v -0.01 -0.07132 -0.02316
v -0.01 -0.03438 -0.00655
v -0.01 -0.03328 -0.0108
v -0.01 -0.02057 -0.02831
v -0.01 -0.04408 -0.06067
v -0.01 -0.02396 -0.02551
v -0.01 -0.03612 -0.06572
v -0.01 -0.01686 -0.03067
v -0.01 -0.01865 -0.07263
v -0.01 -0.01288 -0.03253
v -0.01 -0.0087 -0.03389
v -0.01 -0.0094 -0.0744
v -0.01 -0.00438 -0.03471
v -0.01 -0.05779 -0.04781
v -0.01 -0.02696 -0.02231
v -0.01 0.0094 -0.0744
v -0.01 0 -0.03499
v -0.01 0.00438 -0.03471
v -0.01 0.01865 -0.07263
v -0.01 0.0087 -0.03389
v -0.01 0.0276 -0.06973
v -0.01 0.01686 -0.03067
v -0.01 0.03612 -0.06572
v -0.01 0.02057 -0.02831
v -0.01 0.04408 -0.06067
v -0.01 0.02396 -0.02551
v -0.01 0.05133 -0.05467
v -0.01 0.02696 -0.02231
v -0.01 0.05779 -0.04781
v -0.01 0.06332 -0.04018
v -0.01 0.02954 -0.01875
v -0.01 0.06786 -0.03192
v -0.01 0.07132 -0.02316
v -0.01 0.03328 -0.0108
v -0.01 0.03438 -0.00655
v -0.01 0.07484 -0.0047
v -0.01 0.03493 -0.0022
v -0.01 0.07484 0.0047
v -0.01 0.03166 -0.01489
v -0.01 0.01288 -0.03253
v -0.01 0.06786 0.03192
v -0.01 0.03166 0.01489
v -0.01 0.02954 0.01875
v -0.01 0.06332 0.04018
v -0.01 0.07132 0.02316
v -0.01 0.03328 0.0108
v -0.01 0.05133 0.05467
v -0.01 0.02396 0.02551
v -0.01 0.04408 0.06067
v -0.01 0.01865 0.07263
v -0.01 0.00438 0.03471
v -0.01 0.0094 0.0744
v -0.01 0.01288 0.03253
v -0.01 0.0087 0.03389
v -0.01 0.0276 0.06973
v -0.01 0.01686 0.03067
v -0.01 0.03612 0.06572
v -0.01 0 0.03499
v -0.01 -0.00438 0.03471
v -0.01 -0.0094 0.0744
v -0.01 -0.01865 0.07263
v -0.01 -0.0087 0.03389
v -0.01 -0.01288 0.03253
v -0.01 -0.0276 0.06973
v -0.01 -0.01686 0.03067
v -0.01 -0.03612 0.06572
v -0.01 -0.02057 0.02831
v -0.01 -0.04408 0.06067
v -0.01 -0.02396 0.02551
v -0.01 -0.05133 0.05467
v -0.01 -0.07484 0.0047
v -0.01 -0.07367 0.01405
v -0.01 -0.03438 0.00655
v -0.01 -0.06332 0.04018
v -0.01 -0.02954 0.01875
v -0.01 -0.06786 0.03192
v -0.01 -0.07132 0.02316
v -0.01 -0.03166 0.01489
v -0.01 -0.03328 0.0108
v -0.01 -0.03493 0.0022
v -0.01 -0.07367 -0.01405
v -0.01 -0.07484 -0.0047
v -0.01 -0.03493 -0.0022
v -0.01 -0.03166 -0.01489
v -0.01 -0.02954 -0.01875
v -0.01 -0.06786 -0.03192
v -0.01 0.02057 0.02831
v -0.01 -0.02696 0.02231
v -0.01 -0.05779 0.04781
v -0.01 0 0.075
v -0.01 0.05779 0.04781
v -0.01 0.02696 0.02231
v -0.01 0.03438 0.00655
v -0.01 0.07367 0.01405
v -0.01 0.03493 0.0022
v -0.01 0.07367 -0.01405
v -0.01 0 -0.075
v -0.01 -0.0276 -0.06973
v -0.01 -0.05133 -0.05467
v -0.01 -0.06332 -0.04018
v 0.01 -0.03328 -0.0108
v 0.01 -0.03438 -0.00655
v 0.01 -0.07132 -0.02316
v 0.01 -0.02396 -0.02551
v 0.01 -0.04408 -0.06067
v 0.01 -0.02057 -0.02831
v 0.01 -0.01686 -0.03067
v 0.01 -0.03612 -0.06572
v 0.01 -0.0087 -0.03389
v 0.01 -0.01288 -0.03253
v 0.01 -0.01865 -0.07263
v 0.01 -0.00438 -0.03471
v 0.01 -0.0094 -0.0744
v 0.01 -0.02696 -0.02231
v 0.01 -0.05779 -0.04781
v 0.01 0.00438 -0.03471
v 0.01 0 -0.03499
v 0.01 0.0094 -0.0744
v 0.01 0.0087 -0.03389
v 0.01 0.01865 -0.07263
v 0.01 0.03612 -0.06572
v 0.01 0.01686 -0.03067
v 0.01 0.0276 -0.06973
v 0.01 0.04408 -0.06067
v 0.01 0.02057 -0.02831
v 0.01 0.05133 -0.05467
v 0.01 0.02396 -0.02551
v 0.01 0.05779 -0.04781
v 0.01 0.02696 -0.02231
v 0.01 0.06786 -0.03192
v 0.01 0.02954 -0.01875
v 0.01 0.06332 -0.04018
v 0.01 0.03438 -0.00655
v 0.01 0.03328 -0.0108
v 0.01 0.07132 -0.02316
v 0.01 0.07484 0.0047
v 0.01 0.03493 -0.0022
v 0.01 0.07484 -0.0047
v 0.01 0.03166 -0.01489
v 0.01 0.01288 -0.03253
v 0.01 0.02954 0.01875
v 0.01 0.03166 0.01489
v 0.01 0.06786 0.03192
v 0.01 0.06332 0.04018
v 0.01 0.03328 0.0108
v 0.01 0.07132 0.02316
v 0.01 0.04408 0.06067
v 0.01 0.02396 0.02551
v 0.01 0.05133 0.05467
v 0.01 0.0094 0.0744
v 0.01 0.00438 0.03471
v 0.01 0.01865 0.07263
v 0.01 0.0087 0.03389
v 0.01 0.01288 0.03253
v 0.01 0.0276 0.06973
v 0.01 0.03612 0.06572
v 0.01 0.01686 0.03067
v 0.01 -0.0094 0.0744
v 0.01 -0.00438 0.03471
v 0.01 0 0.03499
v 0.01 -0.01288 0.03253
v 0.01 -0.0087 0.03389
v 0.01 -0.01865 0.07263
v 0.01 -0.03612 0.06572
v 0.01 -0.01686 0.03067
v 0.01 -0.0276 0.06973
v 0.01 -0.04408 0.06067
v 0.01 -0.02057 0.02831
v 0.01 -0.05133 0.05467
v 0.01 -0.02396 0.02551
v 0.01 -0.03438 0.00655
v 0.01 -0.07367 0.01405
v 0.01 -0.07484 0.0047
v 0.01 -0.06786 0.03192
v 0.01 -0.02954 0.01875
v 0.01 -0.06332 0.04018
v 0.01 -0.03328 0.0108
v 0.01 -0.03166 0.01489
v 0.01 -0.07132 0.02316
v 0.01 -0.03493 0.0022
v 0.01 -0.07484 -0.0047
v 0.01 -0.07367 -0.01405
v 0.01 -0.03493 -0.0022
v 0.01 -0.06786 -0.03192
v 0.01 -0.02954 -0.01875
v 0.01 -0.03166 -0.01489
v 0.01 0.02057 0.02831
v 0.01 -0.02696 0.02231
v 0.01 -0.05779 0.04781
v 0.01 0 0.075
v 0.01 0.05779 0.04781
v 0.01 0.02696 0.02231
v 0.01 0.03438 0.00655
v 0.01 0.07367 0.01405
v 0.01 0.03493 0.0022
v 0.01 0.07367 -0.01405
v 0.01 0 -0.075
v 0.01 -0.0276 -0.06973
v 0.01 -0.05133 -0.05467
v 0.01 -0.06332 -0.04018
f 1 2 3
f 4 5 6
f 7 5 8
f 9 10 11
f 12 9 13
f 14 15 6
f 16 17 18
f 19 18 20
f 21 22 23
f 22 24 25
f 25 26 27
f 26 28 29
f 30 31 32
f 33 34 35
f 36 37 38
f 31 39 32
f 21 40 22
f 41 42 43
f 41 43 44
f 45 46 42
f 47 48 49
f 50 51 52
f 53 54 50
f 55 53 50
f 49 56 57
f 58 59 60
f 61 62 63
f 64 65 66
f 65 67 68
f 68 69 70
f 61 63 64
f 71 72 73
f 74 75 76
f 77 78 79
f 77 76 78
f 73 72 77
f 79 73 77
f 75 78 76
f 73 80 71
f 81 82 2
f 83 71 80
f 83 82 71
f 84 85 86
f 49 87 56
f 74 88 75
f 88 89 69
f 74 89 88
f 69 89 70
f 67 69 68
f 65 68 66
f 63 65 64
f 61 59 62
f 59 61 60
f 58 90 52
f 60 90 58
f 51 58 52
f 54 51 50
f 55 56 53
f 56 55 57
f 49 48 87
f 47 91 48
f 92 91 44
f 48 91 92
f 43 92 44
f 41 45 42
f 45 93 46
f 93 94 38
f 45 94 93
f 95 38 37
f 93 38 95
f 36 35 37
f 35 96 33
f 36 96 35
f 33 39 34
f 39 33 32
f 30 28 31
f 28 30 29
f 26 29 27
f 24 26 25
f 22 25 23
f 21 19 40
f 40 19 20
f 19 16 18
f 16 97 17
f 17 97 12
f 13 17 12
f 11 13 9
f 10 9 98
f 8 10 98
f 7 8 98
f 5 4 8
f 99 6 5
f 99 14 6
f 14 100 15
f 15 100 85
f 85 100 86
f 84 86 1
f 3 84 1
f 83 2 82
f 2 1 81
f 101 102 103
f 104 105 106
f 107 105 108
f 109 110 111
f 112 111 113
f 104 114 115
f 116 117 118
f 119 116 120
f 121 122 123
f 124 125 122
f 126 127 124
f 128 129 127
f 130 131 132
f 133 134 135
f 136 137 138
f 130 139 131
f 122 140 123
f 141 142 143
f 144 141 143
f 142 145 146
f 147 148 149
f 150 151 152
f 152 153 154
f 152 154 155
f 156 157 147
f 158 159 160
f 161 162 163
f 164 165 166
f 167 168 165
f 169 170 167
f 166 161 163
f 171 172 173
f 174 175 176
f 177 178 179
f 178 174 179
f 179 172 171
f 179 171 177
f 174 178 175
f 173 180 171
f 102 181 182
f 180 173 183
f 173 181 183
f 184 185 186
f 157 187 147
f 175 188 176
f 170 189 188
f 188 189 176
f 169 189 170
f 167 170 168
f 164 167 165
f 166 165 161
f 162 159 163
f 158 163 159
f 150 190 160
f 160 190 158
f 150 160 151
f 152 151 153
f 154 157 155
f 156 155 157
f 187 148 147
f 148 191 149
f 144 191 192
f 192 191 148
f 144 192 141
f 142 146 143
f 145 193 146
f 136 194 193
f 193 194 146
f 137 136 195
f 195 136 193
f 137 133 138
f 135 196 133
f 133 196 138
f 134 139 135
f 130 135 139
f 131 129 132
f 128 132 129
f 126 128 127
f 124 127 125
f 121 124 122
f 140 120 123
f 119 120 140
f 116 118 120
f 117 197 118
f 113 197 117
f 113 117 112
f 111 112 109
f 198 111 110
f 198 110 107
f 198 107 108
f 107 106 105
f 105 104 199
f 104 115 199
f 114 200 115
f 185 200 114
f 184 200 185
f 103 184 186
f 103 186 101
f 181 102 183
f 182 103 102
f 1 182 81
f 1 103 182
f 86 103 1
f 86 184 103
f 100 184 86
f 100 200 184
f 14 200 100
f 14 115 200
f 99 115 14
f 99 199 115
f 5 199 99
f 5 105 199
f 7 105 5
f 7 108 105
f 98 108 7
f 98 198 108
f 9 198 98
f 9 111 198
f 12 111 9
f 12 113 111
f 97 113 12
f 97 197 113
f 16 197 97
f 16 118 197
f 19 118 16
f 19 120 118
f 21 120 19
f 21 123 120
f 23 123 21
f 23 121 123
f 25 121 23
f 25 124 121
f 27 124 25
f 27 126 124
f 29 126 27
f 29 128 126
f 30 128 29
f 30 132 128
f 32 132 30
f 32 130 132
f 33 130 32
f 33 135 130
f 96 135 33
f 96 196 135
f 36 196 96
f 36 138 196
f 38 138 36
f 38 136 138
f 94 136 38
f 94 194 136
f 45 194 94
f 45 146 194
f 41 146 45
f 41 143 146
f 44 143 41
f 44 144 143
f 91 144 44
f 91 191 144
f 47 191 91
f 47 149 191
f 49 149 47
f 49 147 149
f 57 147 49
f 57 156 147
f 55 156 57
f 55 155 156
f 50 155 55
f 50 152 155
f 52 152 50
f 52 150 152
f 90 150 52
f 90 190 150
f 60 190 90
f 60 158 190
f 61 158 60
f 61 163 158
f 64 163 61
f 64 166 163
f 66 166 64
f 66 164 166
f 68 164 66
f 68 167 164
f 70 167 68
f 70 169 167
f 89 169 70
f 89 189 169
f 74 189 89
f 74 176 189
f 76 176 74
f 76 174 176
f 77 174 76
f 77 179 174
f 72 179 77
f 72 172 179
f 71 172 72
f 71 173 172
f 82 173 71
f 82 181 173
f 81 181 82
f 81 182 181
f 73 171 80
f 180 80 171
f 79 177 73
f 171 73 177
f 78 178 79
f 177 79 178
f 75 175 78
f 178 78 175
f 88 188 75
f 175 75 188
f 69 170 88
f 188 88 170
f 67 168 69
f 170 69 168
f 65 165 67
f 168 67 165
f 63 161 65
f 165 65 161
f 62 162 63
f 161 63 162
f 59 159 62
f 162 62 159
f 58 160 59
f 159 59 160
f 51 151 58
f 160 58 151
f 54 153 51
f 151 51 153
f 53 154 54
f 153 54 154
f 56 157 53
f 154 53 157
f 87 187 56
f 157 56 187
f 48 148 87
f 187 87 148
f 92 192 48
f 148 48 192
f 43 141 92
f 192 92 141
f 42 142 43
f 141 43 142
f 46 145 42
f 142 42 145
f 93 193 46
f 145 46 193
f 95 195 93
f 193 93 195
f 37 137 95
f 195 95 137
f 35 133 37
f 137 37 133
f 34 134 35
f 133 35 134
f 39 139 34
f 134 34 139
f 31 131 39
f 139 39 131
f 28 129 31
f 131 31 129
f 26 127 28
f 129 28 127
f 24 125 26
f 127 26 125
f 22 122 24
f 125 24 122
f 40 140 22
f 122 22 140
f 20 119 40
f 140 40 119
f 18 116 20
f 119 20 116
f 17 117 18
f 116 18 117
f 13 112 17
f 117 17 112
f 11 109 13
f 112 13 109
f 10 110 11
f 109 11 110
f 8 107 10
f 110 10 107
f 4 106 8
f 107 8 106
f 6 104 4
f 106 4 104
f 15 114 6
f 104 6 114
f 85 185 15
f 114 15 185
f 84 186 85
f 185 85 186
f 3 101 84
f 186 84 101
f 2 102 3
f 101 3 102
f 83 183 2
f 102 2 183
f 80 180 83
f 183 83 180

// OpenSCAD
$fn=50;  // REMOVE
PARAM1 = 0.15; // REMOVE
DO = 0.07; // REMOVE
LENGTH = 0.02; // REMOVE
rotate([0,90,0])
linear_extrude(height = (LENGTH), center = true, convexity = 10, twist = 0)
difference()
{
circle(r = (PARAM1)/2);
circle(r = (DO)/2);
}
